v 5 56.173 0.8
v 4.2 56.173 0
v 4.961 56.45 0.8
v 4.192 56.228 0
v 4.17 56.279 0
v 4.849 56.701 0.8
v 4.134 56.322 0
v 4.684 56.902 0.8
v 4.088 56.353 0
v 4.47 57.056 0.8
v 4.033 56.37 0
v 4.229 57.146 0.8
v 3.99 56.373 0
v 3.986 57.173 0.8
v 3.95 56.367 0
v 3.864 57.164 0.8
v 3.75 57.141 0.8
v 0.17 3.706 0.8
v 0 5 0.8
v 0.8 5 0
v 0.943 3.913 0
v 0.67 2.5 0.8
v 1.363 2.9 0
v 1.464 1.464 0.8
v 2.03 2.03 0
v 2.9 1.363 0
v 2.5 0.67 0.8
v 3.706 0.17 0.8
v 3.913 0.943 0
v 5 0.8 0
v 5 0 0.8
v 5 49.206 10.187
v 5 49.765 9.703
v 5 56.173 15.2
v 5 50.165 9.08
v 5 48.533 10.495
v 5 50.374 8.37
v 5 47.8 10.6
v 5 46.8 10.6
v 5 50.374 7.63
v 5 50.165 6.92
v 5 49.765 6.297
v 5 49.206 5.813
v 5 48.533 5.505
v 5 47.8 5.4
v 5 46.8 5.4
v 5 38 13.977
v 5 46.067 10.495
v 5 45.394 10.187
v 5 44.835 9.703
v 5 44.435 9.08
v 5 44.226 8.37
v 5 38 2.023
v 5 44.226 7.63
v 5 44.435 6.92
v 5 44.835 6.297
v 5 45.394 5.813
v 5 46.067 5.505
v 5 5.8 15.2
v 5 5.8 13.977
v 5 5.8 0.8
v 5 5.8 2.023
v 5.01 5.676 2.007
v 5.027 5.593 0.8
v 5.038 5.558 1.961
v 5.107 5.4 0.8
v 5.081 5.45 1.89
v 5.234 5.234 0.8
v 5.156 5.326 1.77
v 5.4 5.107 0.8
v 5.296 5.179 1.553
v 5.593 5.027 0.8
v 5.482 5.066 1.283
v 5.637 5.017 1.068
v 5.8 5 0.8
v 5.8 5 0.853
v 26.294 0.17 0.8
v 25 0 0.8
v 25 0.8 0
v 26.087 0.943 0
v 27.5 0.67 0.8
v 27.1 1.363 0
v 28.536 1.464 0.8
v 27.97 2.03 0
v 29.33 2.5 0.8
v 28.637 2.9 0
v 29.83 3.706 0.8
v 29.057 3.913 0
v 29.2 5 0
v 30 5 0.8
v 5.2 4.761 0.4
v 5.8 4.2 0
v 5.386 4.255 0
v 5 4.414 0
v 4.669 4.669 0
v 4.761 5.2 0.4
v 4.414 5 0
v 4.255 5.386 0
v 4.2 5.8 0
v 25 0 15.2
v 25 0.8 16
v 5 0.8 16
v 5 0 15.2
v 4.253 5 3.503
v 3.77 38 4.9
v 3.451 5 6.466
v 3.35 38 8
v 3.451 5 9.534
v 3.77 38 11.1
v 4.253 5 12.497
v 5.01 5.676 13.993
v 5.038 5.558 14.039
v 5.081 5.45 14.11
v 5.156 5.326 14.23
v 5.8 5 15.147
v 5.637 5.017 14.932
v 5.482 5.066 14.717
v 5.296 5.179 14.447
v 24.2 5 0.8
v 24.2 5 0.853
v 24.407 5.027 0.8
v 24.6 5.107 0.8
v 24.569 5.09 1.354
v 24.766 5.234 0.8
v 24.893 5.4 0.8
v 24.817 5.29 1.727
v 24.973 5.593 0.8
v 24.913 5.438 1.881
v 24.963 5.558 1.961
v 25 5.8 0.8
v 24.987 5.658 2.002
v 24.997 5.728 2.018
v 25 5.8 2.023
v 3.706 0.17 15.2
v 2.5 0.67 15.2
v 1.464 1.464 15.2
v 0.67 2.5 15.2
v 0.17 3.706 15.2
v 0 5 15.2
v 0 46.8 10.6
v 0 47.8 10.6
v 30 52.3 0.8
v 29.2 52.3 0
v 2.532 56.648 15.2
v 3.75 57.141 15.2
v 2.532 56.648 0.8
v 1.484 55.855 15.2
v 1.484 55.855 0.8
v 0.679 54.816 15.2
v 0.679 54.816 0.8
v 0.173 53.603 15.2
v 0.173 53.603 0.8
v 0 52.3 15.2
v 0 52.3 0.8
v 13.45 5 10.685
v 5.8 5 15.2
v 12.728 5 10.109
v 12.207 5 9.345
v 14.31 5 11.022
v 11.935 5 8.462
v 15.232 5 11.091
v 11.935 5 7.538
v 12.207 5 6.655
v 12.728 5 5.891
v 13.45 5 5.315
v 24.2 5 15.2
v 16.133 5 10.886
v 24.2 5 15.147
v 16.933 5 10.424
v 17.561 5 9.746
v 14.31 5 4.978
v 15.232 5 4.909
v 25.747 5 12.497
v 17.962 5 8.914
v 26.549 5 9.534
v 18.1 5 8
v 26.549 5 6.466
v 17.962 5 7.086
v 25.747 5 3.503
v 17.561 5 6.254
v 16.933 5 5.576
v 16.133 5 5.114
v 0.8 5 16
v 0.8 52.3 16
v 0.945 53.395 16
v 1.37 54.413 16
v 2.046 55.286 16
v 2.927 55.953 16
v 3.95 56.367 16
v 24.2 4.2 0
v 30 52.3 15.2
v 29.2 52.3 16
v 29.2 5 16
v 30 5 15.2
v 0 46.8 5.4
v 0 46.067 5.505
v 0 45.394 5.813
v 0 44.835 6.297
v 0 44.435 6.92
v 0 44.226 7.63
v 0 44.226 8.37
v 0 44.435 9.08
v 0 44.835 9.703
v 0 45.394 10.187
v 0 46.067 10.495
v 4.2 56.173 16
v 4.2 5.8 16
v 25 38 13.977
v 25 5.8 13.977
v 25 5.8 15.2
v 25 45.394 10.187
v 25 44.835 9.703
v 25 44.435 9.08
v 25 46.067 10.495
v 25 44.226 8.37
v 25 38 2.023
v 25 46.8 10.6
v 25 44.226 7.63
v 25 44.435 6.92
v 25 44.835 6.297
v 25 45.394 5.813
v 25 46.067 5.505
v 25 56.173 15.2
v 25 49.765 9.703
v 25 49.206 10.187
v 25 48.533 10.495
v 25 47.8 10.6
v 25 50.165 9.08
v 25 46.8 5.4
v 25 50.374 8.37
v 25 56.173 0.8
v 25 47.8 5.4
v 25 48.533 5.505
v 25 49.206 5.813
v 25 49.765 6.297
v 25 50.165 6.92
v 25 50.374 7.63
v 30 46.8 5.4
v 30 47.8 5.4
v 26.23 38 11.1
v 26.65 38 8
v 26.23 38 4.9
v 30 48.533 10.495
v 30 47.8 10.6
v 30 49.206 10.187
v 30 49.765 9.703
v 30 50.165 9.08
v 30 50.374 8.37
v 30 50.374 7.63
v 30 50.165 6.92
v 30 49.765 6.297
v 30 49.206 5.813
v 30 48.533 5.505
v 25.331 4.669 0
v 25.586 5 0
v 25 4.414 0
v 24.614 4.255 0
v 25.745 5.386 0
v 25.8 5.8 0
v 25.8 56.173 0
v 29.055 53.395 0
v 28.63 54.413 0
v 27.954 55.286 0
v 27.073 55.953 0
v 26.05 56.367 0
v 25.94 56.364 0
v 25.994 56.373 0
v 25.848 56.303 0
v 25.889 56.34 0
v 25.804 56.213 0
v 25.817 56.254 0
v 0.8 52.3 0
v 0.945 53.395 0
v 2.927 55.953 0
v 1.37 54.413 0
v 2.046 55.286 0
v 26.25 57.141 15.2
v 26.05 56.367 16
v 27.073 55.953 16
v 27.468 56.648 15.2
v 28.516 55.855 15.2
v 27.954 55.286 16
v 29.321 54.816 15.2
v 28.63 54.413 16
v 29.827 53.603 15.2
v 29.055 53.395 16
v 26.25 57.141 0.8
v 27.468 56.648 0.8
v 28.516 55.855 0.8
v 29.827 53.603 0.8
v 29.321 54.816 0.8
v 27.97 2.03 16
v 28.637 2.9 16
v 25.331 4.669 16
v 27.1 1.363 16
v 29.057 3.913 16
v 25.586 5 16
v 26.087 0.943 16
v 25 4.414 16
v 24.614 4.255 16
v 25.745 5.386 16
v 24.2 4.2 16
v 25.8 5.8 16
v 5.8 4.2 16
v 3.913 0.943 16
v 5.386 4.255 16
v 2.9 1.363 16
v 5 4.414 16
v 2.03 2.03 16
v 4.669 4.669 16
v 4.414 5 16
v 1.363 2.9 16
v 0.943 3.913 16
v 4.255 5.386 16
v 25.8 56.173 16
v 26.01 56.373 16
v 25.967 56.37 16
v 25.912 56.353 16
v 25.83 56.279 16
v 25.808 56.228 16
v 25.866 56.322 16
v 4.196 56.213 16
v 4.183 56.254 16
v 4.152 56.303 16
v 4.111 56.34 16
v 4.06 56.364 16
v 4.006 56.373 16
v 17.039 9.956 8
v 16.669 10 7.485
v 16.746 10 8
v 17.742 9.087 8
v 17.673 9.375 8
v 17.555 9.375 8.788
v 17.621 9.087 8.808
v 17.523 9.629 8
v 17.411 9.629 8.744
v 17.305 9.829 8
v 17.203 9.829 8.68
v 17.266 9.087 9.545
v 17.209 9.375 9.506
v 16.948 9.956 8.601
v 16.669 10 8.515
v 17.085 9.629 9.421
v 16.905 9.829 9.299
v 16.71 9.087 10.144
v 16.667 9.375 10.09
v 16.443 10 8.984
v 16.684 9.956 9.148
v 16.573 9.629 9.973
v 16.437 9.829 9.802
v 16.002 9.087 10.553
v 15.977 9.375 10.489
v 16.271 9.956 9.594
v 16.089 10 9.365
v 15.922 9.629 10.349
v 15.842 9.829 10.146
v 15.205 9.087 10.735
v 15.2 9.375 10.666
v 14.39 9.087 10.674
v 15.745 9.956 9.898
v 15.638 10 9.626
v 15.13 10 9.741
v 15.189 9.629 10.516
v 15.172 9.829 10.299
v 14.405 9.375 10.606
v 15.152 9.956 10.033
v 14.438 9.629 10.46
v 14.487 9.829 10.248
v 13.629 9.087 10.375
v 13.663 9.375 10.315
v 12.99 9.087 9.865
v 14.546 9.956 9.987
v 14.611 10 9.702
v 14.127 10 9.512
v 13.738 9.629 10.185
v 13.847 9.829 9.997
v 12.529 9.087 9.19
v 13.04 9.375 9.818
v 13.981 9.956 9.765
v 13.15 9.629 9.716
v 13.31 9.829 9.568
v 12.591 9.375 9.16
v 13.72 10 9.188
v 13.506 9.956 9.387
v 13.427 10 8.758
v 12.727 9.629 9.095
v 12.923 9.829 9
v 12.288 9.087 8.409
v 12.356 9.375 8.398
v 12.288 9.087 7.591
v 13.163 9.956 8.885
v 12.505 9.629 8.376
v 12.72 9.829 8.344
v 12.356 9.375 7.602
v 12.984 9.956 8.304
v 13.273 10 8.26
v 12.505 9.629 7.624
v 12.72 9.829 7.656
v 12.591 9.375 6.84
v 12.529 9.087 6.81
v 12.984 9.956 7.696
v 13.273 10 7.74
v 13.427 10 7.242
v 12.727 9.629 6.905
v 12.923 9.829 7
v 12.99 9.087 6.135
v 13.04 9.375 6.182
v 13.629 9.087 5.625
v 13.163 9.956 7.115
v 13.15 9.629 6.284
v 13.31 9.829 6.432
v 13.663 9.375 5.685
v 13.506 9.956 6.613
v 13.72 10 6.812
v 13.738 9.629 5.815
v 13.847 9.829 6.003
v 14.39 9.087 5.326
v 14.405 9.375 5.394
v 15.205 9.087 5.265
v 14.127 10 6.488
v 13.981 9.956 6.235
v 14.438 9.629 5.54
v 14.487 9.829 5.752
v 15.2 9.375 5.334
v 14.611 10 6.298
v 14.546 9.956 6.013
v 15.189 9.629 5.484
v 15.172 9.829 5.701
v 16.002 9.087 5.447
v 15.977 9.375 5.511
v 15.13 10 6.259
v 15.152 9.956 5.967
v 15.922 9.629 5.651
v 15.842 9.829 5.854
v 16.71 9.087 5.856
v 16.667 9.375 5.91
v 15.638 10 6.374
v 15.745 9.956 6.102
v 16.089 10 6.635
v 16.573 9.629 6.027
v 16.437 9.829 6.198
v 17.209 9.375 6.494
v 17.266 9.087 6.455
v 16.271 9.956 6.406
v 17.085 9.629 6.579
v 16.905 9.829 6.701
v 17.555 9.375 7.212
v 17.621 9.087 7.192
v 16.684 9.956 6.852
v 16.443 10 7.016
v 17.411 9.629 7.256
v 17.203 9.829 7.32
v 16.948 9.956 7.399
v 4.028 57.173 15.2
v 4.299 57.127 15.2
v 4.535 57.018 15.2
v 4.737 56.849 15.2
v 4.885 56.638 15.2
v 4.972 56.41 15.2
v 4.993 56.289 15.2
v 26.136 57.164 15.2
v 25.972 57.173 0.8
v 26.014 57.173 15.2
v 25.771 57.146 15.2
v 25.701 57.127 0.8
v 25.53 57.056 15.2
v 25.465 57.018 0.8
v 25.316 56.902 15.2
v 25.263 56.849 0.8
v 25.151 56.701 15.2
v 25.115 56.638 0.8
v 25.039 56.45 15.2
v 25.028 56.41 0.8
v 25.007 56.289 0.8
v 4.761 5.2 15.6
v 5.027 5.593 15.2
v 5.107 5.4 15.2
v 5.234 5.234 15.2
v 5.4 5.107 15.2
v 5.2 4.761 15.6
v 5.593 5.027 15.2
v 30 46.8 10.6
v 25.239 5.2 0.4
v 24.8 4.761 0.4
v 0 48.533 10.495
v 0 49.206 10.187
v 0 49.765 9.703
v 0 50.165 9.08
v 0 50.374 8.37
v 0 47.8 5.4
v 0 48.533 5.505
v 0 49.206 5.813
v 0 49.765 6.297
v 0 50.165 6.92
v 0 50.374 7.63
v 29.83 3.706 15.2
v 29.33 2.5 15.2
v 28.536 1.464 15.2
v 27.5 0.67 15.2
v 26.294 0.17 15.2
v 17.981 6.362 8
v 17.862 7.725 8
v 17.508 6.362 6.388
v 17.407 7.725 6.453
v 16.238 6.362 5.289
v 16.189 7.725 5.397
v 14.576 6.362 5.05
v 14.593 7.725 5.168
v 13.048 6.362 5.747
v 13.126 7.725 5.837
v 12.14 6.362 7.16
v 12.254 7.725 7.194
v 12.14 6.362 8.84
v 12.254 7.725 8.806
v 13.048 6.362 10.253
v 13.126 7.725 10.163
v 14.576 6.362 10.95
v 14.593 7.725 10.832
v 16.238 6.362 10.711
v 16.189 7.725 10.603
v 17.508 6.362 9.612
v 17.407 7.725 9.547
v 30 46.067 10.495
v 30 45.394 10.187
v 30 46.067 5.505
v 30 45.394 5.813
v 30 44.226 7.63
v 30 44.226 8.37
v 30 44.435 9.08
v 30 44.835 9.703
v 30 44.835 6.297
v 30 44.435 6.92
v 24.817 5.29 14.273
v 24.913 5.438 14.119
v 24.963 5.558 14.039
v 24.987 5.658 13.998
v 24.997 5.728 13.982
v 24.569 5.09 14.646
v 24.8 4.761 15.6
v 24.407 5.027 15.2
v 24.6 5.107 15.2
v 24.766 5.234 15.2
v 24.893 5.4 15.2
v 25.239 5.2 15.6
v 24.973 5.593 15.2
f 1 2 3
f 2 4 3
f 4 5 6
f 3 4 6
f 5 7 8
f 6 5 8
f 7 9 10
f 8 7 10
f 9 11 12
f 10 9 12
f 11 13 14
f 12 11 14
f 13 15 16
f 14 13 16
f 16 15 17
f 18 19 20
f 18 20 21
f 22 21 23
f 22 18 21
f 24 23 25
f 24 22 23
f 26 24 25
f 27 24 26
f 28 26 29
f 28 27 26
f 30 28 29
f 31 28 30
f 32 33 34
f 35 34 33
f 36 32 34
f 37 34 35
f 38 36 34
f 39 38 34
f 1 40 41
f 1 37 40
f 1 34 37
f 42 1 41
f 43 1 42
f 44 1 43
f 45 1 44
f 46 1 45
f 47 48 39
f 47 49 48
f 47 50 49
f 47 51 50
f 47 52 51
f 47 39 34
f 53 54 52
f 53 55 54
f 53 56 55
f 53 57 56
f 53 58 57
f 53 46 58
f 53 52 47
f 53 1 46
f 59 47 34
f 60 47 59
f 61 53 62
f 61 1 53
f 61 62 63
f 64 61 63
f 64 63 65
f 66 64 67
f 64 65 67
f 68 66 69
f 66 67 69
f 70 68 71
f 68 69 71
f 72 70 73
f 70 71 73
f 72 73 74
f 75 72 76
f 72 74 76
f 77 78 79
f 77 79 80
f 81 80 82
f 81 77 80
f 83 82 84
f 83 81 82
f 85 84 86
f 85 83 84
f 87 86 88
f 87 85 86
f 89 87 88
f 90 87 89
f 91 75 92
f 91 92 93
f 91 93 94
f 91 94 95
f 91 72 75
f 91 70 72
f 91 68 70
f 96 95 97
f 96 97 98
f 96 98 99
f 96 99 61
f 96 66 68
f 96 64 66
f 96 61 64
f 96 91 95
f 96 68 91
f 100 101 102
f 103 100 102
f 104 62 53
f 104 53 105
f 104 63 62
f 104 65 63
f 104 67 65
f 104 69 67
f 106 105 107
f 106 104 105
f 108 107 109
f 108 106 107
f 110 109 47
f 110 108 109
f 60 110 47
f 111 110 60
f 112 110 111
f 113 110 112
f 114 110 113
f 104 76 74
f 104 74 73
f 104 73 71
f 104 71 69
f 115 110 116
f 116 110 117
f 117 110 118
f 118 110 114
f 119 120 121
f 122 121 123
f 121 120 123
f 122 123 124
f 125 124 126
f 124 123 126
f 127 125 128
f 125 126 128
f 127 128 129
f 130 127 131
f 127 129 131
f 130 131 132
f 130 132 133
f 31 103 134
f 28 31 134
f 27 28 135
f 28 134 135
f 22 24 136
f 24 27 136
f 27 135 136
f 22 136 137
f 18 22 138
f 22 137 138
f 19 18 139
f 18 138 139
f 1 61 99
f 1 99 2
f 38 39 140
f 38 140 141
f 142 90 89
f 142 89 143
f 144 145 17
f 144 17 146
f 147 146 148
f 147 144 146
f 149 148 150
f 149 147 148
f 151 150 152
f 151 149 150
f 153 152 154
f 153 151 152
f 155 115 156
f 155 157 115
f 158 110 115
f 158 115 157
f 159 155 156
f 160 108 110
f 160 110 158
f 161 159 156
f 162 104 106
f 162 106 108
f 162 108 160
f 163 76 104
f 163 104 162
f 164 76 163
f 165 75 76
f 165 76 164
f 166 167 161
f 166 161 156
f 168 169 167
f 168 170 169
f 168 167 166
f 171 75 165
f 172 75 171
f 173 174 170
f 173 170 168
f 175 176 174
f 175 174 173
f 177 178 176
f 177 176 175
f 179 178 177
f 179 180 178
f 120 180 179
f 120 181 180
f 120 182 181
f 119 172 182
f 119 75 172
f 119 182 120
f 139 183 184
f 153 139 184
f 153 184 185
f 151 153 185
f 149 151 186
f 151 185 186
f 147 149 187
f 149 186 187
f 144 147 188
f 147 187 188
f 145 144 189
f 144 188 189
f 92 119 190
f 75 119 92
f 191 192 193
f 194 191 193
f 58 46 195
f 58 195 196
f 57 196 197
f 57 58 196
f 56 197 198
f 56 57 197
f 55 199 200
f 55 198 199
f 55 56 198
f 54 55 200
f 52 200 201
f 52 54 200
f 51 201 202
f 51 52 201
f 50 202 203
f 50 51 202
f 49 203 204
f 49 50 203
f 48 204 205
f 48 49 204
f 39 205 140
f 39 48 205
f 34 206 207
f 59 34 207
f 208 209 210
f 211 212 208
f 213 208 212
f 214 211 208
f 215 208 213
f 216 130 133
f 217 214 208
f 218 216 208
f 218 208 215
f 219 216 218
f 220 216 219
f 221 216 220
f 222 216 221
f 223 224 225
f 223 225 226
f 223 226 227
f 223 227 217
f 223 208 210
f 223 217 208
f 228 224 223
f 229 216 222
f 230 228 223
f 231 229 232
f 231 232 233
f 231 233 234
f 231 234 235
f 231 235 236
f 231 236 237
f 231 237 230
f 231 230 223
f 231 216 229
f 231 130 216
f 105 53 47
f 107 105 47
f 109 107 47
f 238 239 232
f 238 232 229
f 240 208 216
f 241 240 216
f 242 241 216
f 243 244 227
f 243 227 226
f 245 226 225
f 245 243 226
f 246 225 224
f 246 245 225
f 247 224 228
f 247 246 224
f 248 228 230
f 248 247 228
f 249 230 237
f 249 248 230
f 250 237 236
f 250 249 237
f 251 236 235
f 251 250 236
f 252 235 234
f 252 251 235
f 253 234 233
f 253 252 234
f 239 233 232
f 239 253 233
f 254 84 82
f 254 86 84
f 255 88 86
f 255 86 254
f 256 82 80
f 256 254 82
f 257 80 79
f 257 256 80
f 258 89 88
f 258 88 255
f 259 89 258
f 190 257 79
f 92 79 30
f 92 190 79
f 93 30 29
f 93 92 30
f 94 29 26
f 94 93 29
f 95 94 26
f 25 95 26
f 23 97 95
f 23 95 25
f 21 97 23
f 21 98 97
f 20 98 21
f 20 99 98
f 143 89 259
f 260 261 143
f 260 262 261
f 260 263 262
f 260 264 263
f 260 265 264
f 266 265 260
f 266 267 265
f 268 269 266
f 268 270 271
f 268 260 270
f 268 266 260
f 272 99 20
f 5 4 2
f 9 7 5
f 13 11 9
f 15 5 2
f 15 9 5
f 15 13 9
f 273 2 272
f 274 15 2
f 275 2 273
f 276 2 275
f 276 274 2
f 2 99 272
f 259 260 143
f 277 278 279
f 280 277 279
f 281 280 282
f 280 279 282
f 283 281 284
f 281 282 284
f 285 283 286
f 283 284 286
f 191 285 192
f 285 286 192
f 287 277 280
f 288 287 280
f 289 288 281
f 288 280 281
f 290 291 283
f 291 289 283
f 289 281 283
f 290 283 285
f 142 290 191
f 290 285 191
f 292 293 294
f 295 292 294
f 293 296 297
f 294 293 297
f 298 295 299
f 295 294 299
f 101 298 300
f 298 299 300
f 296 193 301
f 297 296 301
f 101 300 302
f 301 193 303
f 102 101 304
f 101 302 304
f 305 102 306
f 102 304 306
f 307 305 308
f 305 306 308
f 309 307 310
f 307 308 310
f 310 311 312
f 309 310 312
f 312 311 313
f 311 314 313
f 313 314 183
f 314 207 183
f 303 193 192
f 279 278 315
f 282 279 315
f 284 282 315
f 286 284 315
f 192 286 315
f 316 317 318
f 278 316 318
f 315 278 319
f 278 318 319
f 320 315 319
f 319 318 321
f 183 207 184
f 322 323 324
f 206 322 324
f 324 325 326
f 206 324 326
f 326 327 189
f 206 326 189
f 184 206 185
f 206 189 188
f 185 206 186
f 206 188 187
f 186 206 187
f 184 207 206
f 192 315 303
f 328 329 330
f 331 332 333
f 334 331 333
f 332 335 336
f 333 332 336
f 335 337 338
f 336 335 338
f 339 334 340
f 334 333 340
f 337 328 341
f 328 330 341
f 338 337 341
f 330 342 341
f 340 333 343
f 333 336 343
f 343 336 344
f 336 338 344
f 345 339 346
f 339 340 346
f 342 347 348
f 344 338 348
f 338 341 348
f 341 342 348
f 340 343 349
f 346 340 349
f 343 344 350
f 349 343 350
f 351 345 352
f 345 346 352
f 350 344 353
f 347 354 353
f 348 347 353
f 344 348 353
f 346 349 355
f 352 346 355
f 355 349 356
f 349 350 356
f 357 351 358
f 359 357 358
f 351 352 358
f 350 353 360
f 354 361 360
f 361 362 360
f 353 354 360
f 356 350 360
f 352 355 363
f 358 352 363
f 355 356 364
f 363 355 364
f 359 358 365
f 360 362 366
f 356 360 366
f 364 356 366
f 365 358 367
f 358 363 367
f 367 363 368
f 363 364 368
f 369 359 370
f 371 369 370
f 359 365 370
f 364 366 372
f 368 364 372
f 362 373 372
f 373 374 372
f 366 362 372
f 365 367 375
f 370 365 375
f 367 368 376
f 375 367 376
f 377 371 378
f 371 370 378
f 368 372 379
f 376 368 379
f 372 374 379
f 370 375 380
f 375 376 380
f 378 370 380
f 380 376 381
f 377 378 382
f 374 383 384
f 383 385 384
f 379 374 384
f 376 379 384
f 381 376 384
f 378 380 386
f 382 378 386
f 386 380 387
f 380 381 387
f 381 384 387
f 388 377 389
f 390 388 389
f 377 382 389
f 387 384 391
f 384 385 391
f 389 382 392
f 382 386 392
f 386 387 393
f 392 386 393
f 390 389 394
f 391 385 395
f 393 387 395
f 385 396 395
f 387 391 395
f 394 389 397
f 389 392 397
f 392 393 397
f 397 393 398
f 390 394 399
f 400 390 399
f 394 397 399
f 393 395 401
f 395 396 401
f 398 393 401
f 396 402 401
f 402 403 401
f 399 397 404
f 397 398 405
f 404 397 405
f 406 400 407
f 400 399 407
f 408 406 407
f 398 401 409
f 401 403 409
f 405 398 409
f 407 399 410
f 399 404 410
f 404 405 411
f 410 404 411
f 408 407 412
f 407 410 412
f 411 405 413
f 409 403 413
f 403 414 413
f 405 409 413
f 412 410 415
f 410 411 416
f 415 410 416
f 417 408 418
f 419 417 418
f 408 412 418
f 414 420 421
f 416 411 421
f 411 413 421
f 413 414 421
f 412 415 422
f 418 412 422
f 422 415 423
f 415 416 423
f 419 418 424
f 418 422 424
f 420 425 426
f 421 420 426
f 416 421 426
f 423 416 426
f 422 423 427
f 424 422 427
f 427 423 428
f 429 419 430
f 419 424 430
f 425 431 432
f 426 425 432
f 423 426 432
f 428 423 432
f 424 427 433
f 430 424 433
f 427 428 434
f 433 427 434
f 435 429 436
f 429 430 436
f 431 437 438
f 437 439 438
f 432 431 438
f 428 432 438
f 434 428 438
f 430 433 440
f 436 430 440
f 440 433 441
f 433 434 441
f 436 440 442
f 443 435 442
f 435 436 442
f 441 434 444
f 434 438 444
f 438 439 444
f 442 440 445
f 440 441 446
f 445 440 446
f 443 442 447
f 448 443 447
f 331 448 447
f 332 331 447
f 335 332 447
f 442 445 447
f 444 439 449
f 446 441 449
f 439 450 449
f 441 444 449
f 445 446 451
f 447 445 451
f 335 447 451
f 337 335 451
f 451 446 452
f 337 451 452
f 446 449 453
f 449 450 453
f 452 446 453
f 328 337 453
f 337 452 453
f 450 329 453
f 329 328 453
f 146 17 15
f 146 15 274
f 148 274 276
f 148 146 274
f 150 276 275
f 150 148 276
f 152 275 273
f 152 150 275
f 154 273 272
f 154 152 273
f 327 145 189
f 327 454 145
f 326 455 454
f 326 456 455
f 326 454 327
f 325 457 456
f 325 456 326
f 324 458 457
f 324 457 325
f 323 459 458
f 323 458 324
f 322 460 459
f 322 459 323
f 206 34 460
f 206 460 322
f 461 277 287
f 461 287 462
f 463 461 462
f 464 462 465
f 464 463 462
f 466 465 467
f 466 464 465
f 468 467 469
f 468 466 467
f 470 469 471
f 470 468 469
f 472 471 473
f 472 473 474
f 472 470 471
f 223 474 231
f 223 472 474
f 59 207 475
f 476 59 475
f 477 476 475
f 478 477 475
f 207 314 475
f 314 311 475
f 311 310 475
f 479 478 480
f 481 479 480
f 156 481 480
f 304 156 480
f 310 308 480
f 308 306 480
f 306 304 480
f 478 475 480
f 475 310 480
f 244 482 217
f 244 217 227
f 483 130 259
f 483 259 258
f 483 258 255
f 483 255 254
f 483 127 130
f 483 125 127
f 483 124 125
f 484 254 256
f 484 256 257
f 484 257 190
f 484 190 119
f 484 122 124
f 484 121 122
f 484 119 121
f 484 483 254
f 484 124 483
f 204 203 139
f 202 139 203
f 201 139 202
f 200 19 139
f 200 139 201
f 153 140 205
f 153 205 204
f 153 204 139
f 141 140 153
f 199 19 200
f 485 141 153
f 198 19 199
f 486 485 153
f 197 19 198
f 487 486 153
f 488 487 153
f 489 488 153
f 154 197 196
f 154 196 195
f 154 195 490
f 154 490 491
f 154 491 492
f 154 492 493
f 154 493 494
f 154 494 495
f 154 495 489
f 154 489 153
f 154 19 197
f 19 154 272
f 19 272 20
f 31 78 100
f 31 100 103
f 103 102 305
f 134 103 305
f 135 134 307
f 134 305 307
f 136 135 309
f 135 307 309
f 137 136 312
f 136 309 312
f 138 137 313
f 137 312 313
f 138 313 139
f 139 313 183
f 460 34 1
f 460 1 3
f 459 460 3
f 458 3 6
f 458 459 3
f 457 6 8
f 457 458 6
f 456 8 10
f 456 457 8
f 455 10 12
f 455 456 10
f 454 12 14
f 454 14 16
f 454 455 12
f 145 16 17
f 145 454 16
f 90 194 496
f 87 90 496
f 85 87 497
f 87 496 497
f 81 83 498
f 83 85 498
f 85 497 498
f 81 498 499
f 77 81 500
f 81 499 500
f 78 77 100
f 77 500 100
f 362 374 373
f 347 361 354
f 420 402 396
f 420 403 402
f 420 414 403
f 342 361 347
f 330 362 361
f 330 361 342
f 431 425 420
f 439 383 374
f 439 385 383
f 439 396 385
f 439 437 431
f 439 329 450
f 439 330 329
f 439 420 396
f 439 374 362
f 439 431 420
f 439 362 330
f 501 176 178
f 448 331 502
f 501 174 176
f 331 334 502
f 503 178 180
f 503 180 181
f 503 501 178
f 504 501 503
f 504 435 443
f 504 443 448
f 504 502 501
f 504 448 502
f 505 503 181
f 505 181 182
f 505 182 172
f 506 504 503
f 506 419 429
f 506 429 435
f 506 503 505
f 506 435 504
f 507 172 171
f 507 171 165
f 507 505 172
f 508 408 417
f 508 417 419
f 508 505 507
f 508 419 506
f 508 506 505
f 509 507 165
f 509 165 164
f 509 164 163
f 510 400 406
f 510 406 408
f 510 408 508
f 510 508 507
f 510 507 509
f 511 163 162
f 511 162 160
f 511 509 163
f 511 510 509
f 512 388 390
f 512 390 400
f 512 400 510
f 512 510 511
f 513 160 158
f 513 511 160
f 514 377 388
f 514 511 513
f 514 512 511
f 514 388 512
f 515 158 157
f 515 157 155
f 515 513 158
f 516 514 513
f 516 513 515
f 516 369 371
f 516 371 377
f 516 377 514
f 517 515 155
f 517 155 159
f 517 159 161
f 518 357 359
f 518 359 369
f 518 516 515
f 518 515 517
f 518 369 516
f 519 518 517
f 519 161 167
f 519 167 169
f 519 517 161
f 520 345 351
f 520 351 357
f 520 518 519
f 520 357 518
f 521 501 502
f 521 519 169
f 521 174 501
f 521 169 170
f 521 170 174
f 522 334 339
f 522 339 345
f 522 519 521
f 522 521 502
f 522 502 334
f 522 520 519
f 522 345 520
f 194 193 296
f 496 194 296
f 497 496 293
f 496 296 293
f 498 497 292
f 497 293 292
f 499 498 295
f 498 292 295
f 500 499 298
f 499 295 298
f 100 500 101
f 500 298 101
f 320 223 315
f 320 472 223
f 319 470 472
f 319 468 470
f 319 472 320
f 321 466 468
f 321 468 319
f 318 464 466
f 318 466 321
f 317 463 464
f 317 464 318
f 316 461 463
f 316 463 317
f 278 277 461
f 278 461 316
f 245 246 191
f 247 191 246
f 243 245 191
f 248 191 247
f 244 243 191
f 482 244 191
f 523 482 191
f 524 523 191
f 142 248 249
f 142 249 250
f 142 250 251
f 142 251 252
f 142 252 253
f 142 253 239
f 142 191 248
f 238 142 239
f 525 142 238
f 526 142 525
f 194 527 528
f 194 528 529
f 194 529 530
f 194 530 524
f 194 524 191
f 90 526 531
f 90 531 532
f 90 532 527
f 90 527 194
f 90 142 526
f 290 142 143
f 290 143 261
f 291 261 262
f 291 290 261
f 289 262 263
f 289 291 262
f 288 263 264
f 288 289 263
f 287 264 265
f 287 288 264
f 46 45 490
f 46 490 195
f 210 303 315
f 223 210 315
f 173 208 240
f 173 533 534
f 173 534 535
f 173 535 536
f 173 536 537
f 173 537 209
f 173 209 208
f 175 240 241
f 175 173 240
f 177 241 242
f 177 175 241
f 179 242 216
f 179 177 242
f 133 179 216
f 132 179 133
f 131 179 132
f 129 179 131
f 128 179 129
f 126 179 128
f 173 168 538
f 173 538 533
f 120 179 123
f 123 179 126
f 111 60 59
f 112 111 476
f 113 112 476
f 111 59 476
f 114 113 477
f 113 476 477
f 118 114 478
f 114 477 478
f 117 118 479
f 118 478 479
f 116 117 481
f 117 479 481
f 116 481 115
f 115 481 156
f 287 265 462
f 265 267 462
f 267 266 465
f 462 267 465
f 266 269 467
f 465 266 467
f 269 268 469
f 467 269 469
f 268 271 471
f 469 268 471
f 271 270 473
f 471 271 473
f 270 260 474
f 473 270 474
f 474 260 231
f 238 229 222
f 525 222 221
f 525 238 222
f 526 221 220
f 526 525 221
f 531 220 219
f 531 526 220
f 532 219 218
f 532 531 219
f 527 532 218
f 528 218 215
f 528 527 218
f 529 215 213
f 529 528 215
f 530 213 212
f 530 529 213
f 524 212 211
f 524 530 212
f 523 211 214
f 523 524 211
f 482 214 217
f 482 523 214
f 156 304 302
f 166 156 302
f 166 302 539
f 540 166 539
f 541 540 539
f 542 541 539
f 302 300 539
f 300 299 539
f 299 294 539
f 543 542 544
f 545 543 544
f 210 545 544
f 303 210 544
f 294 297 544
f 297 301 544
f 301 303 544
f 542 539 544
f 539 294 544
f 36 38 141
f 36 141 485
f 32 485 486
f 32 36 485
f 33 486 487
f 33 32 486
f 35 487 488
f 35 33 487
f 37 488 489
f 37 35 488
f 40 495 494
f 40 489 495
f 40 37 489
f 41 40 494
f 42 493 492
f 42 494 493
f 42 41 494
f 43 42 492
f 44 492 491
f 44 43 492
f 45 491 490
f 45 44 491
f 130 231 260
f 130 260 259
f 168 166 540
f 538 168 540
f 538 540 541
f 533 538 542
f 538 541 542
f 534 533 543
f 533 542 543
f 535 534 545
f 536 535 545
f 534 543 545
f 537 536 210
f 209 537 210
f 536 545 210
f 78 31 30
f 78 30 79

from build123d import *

# Parameters (mm, degrees)
BOSS_EXTRUDE1_DEPTH = 16
FILLET3_R           = 0.8
CUT_EXTRUDE1_START  = 5
SKETCH3_R           = 11.65
CUT_EXTRUDE1_DEPTH  = 33
SKETCH2_R           = 3.1
BOSS_EXTRUDE2_DEPTH = 5
BOSS_EXTRUDE2_TAPER = 5
CUT_EXTRUDE2_DEPTH  = 67.627997142
FILLET1_R           = 5
FILLET2_R           = 1
CHAMFER2_SIZE       = 0.8


with BuildPart() as part:
    # Sketch1 → Boss-Extrude1 (new body)
    with BuildSketch(Plane.XY):
        Polygon((0, 0), (0, 57.3), (5, 57.3), (5, 5), (25, 5), (25, 57.3), (30, 57.3), (30, 0), align=None)
    extrude(amount=BOSS_EXTRUDE1_DEPTH)

    # Fillet3
    fillet3_edges = [part.edges().sort_by_distance(p)[0] for p in [
        (5, 5, 8),
        (25, 5, 8),
    ]]
    fillet(fillet3_edges, radius=FILLET3_R)

    # Sketch3 → Cut-Extrude1 (cut)
    with BuildSketch(Plane(origin=(0, 0, 0), x_dir=(1, 0, 0), z_dir=(0, 1, 0)).offset(CUT_EXTRUDE1_START)):
        with Locations((15, -8)):
            Circle(SKETCH3_R)
    extrude(amount=CUT_EXTRUDE1_DEPTH, mode=Mode.SUBTRACT)

    # Sketch2 → Boss-Extrude2 (add)
    with BuildSketch(Plane(origin=(0, 5, 0), x_dir=(1, 0, 0), z_dir=(0, 1, 0))):
        with Locations((15, -8)):
            Circle(SKETCH2_R)
    extrude(amount=BOSS_EXTRUDE2_DEPTH, taper=BOSS_EXTRUDE2_TAPER)

    # Sketch5 → Cut-Extrude2 (cut, through all)
    with BuildSketch(Plane(origin=(30, 0, 0), x_dir=(0, 0, -1), z_dir=(1, 0, 0))):
        with BuildLine():
            Line((-5.4, 47.8), (-5.4, 46.8))
            ThreePointArc((-5.4, 46.8), (-8, 44.2), (-10.6, 46.8))
            Line((-10.6, 46.8), (-10.6, 47.8))
            ThreePointArc((-10.6, 47.8), (-8, 50.4), (-5.4, 47.8))
        make_face()
    extrude(amount=-CUT_EXTRUDE2_DEPTH, mode=Mode.SUBTRACT)

    # Fillet1
    fillet1_edges = [part.edges().sort_by_distance(p)[0] for p in [
        (0, 0, 8),
        (30, 0, 8),
        (30, 57.3, 8),
        (0, 57.3, 8),
    ]]
    fillet(fillet1_edges, radius=FILLET1_R - 0.0001)  # a hair under: the kernel refuses the full size

    # Fillet2
    fillet2_edges = [part.edges().sort_by_distance(p)[0] for p in [
        (5, 57.3, 8),
        (25, 57.3, 8),
        (12.337443318, 10, 8),
    ]]
    fillet(fillet2_edges, radius=FILLET2_R)

    # Chamfer2
    chamfer2_edges = [part.edges().sort_by_distance(p)[0] for p in [
        (1.047161628, 55.361939214, 0),
        (30, 28.65, 16),
        (15, 0, 16),
        (0, 28.65, 16),
        (28.535563195, 1.464436805, 16),
        (1.464436805, 1.464436805, 16),
        (28.952838372, 55.361939214, 16),
        (25, 30.986502943, 16),
        (25, 30.986502943, 0),
        (28.952838372, 55.361939214, 0),
        (4.61238009, 56.963569371, 0),
        (25.38761991, 56.963569371, 0),
        (1.047161628, 55.361939214, 16),
        (4.61238009, 56.963569371, 16),
        (25.38761991, 56.963569371, 16),
        (5, 30.986502943, 0),
        (5, 30.986502943, 16),
        (15, 5, 0),
        (15, 5, 16),
        (5.234314575, 5.234314575, 0),
        (5.234314575, 5.234314575, 16),
        (24.765685425, 5.234314575, 0),
        (24.765685425, 5.234314575, 16),
        (15, 0, 0),
        (0, 28.65, 0),
        (30, 28.65, 0),
        (28.535563195, 1.464436805, 0),
        (1.464436805, 1.464436805, 0),
    ]]
    chamfer(chamfer2_edges, length=CHAMFER2_SIZE)


solid = part.part
